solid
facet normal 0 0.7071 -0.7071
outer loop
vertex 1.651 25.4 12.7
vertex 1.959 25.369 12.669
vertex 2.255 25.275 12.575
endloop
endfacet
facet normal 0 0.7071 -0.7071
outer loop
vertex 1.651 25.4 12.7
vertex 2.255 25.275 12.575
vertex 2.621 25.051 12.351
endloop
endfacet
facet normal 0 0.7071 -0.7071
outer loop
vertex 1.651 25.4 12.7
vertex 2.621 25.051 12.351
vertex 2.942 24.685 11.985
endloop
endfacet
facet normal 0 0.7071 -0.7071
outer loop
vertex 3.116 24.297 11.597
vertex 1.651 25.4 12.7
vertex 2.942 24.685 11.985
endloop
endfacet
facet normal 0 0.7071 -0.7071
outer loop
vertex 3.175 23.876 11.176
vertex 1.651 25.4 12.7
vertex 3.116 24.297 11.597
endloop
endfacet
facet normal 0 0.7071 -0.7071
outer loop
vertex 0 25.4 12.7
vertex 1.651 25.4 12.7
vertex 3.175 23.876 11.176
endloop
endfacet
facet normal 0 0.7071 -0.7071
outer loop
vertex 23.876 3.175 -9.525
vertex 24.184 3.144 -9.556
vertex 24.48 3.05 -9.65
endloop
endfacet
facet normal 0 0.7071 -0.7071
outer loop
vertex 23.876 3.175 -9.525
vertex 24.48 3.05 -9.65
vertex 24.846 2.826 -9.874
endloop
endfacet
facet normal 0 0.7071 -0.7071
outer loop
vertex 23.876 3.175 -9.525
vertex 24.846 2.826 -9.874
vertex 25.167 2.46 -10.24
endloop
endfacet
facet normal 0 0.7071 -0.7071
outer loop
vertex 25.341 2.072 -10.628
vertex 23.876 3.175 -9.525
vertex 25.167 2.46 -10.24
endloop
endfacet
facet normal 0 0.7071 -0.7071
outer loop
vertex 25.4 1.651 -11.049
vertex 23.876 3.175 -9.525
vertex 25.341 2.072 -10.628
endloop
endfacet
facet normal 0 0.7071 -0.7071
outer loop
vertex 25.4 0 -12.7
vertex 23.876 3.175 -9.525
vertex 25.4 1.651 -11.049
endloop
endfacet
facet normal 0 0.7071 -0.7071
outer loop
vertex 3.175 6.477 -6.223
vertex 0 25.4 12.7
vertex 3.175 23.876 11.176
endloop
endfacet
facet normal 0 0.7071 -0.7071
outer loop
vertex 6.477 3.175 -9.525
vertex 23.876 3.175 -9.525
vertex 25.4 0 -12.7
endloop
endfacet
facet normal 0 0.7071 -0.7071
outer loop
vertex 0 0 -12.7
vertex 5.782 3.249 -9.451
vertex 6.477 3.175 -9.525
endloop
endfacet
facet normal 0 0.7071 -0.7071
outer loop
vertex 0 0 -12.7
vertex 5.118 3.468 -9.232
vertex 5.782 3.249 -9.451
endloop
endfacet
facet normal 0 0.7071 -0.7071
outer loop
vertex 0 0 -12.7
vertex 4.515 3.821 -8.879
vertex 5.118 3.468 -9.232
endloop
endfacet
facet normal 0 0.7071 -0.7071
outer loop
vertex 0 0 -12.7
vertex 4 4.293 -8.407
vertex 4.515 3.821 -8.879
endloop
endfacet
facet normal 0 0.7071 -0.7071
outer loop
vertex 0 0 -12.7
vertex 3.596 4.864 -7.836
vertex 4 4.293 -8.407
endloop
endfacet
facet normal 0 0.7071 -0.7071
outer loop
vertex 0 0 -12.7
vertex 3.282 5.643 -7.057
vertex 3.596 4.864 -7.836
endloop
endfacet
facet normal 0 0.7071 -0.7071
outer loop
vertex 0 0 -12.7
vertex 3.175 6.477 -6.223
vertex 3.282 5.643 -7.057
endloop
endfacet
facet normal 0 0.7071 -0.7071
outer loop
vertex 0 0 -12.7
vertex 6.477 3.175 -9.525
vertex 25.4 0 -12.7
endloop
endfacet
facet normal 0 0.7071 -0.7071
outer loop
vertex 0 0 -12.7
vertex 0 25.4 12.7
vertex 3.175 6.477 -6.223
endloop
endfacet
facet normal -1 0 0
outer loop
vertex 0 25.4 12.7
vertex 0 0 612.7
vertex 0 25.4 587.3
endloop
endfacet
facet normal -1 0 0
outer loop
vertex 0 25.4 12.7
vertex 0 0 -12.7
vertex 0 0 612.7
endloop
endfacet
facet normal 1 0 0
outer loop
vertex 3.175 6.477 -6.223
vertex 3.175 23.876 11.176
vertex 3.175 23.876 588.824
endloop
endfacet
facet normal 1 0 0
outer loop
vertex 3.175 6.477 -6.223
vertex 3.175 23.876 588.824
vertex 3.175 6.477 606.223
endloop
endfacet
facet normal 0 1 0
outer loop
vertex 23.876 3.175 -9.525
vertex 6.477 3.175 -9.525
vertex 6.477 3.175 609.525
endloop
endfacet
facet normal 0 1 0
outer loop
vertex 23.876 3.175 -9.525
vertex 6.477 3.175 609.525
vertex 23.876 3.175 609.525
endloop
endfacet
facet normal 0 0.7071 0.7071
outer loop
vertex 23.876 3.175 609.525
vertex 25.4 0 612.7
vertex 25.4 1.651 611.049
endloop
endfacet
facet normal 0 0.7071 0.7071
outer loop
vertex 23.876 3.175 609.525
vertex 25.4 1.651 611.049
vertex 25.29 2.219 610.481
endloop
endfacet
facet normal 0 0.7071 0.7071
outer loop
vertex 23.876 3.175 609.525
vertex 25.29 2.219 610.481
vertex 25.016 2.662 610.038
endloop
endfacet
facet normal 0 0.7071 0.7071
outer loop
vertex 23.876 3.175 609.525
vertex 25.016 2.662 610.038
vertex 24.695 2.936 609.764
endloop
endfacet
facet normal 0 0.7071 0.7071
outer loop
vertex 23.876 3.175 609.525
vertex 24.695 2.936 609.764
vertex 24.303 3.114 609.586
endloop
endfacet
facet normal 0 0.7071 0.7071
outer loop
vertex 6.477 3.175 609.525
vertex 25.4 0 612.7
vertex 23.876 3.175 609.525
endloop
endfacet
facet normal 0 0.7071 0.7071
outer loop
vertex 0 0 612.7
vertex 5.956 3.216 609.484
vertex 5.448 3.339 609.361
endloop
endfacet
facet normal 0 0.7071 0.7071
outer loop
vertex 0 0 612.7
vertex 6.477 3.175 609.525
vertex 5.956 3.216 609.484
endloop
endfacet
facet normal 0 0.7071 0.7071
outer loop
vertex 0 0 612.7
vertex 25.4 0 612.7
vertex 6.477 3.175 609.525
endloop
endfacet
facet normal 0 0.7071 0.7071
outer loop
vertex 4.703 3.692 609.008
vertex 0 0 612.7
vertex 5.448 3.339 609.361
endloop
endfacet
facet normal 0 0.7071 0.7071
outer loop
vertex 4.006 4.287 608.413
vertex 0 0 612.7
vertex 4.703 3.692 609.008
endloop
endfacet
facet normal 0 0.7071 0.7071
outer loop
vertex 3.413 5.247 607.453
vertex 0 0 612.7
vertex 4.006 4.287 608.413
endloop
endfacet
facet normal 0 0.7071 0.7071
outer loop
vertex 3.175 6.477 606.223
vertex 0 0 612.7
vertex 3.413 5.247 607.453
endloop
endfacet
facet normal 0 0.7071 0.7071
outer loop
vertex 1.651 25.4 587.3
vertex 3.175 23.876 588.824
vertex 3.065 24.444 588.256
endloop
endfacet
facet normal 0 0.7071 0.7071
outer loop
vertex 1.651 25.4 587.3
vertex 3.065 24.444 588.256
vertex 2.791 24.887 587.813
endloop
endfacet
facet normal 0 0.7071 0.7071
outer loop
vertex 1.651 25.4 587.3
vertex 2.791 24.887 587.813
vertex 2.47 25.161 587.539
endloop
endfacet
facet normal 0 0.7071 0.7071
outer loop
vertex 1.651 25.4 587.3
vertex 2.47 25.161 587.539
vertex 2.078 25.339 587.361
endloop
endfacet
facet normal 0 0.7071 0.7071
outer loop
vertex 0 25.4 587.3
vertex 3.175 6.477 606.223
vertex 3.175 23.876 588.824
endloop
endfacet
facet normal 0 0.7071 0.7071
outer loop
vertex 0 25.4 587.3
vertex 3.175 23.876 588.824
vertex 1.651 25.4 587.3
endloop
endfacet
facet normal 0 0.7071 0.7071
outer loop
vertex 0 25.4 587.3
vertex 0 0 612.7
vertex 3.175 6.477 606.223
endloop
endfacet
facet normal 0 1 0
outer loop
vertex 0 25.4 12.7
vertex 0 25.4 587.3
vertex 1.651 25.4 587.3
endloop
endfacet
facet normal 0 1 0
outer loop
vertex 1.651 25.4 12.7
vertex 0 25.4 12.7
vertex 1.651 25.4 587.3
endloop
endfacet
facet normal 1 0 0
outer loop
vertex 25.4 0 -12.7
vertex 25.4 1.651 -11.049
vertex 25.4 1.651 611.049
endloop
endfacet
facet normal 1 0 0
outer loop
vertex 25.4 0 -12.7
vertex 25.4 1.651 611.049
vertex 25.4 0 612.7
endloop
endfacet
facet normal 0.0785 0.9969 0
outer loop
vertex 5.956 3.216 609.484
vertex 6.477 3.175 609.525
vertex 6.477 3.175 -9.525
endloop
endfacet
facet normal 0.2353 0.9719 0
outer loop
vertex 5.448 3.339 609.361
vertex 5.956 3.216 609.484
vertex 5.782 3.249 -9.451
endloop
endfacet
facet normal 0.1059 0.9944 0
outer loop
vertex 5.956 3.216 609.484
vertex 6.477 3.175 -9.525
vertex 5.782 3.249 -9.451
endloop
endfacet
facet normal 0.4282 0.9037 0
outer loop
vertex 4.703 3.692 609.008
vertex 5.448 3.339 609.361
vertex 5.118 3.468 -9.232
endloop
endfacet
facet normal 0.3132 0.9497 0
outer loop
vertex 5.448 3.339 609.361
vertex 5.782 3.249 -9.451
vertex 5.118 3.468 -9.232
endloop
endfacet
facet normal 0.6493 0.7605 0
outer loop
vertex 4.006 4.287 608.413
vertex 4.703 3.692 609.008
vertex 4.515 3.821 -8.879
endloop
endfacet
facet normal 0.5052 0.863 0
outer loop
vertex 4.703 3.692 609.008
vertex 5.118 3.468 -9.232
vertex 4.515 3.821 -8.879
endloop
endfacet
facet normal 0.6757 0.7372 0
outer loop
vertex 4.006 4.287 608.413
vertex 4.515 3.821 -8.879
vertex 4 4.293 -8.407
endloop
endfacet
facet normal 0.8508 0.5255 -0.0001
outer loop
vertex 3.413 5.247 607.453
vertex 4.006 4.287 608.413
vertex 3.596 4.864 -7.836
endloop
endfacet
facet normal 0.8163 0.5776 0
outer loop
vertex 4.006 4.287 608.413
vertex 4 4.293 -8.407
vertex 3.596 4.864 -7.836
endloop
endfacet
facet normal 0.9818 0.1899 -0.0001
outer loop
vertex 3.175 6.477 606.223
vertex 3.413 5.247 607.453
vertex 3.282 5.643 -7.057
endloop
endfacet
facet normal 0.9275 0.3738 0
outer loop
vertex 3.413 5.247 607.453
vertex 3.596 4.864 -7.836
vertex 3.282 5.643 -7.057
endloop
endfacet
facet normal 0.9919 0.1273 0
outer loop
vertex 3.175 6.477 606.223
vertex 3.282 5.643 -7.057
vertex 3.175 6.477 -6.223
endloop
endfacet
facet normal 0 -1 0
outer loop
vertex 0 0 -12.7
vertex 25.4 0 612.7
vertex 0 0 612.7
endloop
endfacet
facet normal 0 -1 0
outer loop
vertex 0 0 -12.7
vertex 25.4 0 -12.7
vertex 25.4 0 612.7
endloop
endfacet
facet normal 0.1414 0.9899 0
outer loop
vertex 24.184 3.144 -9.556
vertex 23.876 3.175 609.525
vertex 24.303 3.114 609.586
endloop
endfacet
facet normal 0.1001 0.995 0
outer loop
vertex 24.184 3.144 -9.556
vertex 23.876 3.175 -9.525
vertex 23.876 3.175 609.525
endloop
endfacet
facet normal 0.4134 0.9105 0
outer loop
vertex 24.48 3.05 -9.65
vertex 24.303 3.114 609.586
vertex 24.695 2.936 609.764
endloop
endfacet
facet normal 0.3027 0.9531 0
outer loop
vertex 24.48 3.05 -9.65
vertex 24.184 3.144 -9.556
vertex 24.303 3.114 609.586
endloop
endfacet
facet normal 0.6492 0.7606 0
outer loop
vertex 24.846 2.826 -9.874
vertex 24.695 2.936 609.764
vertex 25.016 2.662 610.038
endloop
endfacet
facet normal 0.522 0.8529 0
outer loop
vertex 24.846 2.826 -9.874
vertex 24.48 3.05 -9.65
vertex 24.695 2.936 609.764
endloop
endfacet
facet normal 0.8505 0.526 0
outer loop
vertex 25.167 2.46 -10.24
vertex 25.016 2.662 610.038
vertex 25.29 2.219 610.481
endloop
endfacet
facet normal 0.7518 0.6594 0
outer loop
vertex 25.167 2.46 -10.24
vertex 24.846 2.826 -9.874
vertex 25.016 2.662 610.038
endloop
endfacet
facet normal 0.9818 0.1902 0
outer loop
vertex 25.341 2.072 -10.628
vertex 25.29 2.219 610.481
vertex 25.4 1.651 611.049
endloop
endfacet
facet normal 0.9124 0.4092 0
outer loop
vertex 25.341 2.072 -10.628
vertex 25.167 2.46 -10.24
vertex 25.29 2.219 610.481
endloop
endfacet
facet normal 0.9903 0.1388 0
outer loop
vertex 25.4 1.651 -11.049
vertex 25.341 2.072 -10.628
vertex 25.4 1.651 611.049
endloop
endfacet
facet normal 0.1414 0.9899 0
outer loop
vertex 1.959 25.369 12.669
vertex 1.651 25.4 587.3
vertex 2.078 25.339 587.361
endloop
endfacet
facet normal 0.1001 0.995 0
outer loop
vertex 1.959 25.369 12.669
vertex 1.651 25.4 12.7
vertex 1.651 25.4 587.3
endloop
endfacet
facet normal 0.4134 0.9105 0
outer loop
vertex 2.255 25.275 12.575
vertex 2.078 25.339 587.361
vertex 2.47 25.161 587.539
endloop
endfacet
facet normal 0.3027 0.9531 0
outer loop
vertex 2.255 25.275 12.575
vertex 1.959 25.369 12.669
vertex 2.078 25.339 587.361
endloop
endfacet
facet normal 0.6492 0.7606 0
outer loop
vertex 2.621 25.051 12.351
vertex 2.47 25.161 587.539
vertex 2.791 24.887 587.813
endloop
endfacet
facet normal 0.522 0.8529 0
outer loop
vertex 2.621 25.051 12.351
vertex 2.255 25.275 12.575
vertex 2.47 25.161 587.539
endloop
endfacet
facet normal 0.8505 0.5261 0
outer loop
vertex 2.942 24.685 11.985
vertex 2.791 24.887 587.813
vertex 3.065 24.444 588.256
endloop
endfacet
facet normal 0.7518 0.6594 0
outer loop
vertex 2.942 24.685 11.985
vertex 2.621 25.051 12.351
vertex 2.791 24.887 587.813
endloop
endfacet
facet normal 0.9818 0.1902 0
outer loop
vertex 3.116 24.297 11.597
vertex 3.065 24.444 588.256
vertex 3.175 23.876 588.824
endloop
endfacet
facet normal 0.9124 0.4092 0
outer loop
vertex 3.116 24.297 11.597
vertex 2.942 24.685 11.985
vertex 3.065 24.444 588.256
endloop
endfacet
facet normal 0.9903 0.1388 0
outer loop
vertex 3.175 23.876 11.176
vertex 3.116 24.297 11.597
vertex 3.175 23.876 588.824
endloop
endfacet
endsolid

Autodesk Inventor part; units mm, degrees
ref_plane "Start Plane" through (0, 0, -12.7) normal (0, 0, 1) x (1, 0, 0)
ref_plane "End Plane" through (0, 0, 612.7) normal (0, 0, 1) x (1, 0, 0)
sketch "Sketch" plane through (0, 0, 0) normal (0, 0, 1) x (1, 0, 0)
  line L0 (25.4, 0) -> (0, 0)
  line L1 (0, 0) -> (0, 25.4)
  line L2 (0, 25.4) -> (1.651, 25.4)
  line L3 (3.175, 23.876) -> (3.175, 6.477)
  line L4 (6.477, 3.175) -> (23.876, 3.175)
  line L5 (25.4, 1.651) -> (25.4, 0)
  line L6 (0, -11.0414) -> (0, 31.5385) construction
  line L7 (-11.0414, 0) -> (31.5385, 0) construction
  arc A0 (3.175, 6.477) -> (6.477, 3.175) centre (6.477, 6.477) ccw
  arc A1 (3.175, 23.876) -> (1.651, 25.4) centre (1.651, 23.876) ccw
  arc A2 (25.4, 1.651) -> (23.876, 3.175) centre (23.876, 1.651) ccw
  line L8 (0, 40.0545) -> (0, -19.5574) construction
  line L9 (-19.5574, 0) -> (40.0545, 0) construction
  point P0 (3.175, 25.4)
  point P1 (3.175, 3.175)
  point P2 (25.4, 3.175)
  dimension "d0" = 25.4
  dimension "d1" = 25.4
  dimension "d2" = 3.175
  dimension "d3" = 3.175
  dimension "d10" = 0
  dimension "d11" = 0
  dimension "d14" = 3.302
  dimension "d15" = 1.524
extrude "Body" add sketch "Sketch" along normal up to surface (625.4 mm away) from surface at -12.7
sketch "Sketch3" plane through (0, 0, 0) normal (0, 0, 1) x (1, 0, 0)
  line L0 (0, 0) -> (10, 0)
ref_plane "Work Plane3" through (0, 0, 0) normal (0, -1, 0) x (1, 0, 0)
ref_plane "Work Plane4" through (12.7, 0, -12.7) normal (0, 0.7071, -0.7071) x (1, 0, 0)
split "Split1" plane through (12.7, 0, -12.7) removes the side toward (0, 0.7071, -0.7071)
ref_plane "Work Plane5" through (12.7, 0, 612.7) normal (0, 0.7071, 0.7071) x (1, 0, 0)
split "Split2" plane through (12.7, 0, 612.7) removes the side toward (0, 0.7071, 0.7071)
sketch "Sketch4" plane through (0, 0, 0) normal (0, -1, 0) x (1, 0, 0)
  line L0 (-2, -12.7) -> (12, -12.7) projected
  line L1 (-2, 612.7) -> (12, 612.7) projected
  dimension "d17" = 625.4
equation "\"d0\" = G_H"
equation "\"d1\" = G_H"
equation "\"d2\" = G_T"
equation "\"d3\" = G_T"
equation "\"d14\" = G_IR"
equation "\"d15\" = G_ER"
equation "\"d4\" = G_L"
equation "\"G_H\" = 25.4"
equation "\"G_T\" = 3.175"
equation "\"G_ER\" = 1.524"
equation "\"G_IR\" = 3.302"
equation "\"G_L\" = d17"
equation "\"ex\" = 0"
equation "\"G_OFFSET_START\" = 12.7"
equation "\"G_OFFSET_END\" = 12.7"
equation "\"d12\" = -G_OFFSET_START"
equation "\"d13\" = G_OFFSET_END + B_L"
equation "\"B_L\" = 600"
properties part number "AISC - L 1 x 1 x 1/8 - 24.622" material "Steel, Mild"
